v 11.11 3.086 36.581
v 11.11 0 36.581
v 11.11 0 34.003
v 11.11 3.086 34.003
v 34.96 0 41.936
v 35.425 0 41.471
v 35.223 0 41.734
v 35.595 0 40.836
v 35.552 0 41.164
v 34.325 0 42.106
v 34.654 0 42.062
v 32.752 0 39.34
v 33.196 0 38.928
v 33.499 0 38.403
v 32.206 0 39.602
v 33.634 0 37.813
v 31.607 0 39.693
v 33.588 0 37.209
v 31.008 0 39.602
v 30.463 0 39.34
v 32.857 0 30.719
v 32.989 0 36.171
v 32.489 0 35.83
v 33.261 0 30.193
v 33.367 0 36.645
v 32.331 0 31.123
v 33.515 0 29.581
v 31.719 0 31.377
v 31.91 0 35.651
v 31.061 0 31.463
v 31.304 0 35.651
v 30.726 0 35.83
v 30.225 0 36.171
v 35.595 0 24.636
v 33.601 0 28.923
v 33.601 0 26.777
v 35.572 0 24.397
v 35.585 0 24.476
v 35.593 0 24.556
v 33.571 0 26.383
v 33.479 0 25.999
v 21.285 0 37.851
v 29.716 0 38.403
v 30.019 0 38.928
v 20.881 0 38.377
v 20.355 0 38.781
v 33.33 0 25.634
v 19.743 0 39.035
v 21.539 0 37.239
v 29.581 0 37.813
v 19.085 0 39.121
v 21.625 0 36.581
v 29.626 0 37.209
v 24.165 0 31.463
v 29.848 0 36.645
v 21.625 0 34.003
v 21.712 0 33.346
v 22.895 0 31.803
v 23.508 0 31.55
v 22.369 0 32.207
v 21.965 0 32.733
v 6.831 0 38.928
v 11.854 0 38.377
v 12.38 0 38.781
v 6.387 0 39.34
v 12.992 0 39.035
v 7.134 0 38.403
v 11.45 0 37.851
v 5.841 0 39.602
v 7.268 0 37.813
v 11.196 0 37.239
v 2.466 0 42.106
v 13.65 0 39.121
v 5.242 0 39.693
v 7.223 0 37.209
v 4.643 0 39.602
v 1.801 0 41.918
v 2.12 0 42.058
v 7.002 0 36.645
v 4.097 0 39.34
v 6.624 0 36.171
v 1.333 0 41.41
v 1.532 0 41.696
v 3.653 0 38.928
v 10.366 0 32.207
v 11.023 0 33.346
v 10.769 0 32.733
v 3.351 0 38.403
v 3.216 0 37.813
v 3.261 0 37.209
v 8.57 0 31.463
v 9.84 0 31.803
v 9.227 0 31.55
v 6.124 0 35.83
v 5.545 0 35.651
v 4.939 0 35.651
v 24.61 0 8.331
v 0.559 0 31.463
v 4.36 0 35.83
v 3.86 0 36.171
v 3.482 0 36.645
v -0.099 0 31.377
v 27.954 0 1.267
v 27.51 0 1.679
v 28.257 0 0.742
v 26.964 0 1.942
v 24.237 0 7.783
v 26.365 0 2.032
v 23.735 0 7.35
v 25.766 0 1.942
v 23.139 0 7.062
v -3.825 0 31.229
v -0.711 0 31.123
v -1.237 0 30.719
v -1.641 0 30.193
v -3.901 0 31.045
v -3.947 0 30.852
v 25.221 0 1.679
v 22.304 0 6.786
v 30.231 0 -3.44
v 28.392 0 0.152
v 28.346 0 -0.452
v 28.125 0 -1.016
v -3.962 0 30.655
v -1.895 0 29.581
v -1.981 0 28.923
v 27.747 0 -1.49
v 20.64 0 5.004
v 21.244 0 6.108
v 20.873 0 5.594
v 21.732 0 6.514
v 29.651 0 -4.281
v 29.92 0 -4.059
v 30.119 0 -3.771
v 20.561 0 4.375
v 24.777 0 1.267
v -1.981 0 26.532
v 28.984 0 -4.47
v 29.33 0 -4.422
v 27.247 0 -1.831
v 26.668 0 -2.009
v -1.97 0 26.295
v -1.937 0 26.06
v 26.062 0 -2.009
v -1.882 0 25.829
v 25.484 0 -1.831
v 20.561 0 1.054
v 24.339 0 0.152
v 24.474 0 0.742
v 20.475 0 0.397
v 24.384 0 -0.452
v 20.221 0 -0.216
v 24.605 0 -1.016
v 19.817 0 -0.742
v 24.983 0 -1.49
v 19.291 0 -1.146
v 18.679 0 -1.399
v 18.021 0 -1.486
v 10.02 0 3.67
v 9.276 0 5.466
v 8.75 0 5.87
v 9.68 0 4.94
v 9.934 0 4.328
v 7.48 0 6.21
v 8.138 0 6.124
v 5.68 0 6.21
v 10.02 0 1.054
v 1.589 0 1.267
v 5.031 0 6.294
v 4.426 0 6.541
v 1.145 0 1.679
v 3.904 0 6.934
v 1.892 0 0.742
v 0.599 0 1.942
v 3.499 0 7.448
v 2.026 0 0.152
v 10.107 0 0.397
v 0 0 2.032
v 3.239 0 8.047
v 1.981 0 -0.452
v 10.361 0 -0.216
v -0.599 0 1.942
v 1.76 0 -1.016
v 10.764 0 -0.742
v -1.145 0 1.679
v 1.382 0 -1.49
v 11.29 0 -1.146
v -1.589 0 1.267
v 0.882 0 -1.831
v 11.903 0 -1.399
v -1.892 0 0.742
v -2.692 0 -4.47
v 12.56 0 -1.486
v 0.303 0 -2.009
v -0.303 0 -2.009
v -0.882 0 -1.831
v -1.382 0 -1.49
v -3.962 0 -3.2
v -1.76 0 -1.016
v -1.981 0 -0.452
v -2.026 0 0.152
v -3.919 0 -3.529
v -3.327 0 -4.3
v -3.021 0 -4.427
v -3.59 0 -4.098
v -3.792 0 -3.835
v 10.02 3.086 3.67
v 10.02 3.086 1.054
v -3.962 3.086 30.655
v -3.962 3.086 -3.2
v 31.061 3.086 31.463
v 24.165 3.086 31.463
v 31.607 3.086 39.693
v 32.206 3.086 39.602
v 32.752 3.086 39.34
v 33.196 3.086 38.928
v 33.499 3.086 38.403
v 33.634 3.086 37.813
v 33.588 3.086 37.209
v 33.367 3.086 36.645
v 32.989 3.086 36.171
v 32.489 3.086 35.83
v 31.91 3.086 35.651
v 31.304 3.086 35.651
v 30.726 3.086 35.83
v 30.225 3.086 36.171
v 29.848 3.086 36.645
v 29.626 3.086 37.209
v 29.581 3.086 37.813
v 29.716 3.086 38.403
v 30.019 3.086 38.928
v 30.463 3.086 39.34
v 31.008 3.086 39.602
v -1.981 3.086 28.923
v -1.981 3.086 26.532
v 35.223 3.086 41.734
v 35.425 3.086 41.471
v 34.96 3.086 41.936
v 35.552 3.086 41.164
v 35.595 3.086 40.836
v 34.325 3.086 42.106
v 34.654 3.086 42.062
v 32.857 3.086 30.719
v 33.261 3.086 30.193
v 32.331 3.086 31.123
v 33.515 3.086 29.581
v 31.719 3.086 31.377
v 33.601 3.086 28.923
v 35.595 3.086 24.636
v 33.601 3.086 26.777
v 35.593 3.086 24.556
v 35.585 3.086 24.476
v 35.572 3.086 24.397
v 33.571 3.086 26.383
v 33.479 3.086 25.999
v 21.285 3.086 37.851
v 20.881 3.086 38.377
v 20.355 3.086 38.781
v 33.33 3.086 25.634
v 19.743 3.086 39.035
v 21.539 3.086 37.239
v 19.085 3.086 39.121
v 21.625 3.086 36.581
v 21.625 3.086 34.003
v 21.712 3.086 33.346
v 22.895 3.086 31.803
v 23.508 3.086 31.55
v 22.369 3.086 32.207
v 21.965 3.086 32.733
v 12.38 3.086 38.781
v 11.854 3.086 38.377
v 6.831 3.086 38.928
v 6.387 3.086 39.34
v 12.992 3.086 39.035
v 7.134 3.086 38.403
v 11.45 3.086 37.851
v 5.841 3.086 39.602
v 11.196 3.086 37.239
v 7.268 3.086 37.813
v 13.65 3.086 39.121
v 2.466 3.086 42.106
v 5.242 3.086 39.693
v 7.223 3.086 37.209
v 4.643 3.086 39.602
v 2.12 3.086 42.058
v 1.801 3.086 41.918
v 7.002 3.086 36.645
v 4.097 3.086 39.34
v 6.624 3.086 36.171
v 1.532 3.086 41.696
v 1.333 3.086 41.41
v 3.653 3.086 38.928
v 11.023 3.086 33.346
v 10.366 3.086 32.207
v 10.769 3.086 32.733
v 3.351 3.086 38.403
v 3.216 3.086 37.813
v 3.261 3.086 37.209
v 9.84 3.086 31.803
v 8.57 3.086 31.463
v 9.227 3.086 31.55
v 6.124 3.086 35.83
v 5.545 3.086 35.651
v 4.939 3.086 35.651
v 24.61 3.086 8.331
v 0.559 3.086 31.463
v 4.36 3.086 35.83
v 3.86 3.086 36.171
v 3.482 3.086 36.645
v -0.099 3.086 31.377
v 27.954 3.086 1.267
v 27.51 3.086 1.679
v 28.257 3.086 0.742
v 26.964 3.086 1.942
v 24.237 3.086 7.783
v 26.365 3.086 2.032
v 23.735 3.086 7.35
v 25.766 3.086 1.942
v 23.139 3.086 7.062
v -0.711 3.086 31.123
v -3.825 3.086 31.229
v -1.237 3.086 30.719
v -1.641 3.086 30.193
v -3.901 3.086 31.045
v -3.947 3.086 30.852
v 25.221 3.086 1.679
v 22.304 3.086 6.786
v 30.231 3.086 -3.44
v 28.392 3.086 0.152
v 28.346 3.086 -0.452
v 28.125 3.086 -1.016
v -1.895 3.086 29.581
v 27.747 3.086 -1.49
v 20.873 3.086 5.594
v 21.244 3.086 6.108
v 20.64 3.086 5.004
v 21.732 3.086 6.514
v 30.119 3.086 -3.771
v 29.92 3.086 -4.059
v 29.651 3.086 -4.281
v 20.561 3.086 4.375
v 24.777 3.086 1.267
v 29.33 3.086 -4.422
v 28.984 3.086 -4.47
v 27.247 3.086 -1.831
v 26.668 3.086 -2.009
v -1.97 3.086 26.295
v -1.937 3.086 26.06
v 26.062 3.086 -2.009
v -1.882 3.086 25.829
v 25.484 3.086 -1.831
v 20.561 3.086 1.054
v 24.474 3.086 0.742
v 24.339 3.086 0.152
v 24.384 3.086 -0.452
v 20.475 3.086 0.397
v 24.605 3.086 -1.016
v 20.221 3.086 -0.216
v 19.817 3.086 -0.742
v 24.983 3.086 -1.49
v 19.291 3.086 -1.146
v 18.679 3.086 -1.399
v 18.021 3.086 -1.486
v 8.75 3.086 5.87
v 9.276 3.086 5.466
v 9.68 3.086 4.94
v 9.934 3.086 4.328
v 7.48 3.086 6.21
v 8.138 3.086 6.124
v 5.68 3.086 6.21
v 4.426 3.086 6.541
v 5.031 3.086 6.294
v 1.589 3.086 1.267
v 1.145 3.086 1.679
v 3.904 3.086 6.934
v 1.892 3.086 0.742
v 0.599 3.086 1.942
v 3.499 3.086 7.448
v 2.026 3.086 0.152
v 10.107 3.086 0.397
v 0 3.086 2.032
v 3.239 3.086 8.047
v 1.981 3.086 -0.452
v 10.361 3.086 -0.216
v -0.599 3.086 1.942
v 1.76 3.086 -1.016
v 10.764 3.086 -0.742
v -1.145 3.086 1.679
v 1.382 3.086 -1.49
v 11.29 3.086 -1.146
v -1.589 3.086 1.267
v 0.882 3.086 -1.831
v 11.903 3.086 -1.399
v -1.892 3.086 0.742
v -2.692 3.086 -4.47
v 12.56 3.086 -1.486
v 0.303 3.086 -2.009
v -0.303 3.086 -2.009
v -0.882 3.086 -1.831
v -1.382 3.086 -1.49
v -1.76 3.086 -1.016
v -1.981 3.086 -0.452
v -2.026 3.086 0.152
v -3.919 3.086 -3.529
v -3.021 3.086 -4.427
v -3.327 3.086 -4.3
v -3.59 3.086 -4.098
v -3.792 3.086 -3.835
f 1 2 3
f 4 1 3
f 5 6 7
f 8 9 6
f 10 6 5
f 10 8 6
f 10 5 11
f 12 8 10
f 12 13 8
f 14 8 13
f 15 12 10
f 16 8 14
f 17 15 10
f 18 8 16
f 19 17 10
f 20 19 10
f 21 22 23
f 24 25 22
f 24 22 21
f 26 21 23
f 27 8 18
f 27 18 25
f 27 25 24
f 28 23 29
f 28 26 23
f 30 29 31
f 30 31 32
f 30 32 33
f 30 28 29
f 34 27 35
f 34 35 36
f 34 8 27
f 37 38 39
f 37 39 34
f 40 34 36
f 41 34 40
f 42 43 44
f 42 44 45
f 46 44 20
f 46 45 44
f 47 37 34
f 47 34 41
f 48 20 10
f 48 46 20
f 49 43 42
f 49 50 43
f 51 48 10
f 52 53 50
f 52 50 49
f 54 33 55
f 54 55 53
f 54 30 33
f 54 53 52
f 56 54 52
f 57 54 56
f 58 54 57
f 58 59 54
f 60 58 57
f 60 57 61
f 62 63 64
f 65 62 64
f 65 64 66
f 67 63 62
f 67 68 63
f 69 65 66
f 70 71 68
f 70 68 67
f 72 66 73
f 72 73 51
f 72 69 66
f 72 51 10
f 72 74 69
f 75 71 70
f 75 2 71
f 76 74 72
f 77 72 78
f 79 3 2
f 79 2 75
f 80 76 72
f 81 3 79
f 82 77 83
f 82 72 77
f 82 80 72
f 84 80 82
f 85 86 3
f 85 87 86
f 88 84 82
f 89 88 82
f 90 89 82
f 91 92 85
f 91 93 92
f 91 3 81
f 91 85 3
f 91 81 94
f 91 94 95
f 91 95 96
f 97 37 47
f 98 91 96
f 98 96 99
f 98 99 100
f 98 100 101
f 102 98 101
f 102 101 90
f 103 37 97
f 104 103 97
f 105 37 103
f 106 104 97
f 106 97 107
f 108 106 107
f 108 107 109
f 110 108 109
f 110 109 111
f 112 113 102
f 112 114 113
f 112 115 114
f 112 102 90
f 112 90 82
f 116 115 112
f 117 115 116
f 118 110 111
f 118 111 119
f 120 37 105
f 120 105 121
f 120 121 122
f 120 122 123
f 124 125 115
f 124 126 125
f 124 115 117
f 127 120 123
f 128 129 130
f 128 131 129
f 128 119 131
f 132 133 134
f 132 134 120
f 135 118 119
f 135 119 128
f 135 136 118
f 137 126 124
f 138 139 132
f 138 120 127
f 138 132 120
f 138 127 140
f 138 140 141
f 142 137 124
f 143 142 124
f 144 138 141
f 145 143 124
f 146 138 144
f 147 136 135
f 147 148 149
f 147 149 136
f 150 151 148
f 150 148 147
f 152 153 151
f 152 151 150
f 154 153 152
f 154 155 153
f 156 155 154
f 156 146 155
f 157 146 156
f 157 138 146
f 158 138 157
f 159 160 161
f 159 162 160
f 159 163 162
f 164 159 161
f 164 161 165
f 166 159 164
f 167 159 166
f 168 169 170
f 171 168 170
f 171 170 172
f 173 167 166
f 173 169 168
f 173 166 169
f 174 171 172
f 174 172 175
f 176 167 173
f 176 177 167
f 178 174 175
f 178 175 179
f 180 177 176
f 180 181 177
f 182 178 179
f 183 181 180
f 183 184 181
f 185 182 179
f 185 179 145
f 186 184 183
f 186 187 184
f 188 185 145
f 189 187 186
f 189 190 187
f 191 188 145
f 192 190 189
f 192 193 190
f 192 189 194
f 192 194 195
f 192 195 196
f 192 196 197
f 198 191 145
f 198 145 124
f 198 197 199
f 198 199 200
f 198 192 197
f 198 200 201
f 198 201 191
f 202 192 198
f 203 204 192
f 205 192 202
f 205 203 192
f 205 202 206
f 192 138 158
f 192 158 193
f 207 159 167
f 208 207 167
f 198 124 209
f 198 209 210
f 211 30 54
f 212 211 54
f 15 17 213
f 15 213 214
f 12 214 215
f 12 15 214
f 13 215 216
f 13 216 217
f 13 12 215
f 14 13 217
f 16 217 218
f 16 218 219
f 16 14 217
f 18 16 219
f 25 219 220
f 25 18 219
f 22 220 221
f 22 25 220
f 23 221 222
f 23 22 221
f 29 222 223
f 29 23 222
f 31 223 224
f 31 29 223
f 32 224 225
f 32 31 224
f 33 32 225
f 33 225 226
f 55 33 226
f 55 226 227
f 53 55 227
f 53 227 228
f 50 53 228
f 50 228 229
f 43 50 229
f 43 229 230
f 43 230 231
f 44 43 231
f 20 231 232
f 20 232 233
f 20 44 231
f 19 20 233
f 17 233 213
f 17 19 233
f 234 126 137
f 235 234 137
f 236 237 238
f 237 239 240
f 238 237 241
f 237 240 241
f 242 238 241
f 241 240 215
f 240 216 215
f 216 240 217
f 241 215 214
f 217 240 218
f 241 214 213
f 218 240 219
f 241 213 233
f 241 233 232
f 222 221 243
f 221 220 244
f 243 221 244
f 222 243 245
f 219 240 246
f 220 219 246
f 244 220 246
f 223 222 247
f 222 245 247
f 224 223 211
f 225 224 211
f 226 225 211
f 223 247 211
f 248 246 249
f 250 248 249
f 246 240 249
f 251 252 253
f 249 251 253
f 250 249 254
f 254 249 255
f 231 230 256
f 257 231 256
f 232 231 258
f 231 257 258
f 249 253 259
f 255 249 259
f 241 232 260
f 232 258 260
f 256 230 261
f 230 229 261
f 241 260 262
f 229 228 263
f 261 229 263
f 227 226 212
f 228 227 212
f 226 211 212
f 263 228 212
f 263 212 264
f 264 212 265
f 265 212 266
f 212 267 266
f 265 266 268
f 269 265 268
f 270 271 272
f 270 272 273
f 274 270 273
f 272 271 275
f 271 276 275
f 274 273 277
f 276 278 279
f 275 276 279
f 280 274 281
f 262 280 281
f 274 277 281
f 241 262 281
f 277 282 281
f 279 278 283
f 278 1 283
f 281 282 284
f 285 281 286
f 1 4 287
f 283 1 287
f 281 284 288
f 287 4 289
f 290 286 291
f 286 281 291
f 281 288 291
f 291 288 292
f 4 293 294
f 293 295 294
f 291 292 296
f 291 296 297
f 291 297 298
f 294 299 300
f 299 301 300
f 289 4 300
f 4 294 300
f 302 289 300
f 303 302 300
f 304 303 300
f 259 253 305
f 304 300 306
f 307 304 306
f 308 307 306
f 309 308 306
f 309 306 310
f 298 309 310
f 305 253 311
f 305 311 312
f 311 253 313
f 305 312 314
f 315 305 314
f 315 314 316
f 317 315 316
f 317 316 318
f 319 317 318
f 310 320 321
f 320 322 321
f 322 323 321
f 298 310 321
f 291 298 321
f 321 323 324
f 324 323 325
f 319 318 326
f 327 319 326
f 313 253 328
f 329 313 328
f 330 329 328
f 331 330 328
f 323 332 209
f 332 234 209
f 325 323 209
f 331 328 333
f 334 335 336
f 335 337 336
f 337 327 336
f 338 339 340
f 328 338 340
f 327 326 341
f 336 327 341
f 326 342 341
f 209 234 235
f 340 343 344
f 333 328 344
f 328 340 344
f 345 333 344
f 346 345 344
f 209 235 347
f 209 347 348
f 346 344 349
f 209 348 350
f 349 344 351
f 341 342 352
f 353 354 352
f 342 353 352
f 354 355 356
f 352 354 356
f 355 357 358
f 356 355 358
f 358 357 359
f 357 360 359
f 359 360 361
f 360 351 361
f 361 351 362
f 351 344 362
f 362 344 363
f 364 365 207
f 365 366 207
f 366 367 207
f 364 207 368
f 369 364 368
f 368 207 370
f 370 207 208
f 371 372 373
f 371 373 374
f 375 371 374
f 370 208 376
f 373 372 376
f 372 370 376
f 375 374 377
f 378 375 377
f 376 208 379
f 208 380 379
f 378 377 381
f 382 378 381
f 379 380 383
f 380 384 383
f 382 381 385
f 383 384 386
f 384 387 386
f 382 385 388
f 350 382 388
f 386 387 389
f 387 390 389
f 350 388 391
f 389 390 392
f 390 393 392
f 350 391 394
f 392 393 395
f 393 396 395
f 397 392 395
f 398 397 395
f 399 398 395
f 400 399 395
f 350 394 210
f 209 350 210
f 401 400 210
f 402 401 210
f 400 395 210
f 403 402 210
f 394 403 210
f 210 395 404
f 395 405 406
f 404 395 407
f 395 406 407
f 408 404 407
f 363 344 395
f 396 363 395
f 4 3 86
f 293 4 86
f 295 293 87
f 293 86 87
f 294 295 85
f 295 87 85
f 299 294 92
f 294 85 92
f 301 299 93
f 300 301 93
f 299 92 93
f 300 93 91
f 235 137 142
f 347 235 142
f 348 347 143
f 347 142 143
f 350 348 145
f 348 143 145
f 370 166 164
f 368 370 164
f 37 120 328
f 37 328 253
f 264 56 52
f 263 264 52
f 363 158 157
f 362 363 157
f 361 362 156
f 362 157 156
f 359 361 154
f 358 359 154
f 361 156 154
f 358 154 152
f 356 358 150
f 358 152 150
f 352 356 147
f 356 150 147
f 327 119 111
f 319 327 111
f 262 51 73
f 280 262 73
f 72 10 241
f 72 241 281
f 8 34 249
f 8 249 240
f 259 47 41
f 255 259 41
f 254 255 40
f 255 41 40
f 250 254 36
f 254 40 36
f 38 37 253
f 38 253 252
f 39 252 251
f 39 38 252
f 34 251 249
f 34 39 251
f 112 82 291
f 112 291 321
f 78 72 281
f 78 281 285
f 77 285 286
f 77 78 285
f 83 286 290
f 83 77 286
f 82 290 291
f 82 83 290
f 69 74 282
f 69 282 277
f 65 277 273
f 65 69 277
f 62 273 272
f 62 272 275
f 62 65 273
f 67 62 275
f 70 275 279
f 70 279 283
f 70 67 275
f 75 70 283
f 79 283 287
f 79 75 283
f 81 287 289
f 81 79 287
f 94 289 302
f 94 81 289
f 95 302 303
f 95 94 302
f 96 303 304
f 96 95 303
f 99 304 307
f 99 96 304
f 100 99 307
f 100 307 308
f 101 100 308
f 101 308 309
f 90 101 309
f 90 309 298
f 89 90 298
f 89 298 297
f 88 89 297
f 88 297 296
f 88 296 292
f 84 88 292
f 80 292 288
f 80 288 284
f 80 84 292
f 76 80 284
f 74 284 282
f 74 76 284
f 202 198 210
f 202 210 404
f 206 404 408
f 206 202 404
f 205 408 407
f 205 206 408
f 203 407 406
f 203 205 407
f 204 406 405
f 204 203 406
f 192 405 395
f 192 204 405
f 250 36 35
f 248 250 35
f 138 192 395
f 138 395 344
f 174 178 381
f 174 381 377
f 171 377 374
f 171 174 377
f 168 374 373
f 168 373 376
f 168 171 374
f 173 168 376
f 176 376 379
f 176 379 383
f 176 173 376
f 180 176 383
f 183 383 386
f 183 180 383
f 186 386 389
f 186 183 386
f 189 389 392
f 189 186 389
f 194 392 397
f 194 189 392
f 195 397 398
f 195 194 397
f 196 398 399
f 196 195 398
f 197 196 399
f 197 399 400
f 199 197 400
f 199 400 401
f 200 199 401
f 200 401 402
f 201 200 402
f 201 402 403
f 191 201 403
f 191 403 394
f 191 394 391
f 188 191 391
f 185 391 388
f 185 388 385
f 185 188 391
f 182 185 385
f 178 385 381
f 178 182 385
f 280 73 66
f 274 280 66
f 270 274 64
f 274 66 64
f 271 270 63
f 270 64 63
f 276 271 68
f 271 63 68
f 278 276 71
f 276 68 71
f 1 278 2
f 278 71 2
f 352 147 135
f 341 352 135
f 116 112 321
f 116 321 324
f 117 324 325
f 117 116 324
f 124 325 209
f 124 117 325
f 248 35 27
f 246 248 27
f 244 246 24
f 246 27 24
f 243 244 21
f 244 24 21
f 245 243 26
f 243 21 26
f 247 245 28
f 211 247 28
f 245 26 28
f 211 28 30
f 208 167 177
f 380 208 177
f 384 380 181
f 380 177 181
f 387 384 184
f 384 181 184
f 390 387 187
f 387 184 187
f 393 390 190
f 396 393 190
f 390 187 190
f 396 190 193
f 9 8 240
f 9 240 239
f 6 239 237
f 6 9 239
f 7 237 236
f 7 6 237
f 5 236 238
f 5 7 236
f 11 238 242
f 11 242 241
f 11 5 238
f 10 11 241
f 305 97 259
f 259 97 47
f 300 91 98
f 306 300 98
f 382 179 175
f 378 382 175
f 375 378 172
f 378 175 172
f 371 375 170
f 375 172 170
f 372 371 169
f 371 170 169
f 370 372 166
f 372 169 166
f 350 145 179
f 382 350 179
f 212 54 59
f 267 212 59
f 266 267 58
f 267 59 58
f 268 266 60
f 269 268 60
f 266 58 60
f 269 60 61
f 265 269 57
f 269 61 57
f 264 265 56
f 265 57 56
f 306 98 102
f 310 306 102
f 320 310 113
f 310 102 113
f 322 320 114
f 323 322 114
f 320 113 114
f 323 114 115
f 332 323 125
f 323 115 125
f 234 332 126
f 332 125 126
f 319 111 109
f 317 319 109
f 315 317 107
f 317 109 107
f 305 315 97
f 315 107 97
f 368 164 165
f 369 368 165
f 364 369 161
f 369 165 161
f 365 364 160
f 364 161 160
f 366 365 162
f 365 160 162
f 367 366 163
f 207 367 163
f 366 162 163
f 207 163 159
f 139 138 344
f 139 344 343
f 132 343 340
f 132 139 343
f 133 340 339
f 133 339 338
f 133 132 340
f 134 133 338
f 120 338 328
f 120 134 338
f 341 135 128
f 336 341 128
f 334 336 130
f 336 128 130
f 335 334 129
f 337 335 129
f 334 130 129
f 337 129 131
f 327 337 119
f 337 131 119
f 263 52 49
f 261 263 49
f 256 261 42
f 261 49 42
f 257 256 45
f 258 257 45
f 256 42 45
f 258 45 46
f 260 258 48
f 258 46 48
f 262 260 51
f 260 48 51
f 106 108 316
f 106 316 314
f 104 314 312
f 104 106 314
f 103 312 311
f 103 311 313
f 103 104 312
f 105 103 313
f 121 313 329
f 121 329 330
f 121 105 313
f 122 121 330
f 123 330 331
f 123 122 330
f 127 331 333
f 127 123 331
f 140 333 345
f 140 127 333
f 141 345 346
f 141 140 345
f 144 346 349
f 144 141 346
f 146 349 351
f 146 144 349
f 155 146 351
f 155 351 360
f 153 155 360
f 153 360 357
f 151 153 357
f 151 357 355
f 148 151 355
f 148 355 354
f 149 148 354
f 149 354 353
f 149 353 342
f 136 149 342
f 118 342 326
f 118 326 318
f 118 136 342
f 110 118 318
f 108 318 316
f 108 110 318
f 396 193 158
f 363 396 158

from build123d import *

# Parameters (mm, degrees)
SKETCH1_R           = 2.032
BOSS_EXTRUDE1_DEPTH = 3.0861


with BuildPart() as part:
    # Sketch1 → Boss-Extrude1 (new body)
    with BuildSketch(Plane(origin=(0, 0, 0), x_dir=(1, 0, 0), z_dir=(0, 1, 0))):
        with BuildLine():
            Line((-2.6924, 4.4704), (28.98404818, 4.4704))
            ThreePointArc((28.98404818, 4.4704), (29.793051754, 4.179385811), (30.23129703, 3.439712155))
            Line((30.23129703, 3.439712155), (35.572400198, -24.397088649))
            ThreePointArc((35.572400198, -24.397088649), (35.589450767, -24.516205211), (35.595151349, -24.636400804))
            Line((35.595151349, -24.636400804), (35.595151349, -40.835711832))
            ThreePointArc((35.595151349, -40.835711832), (35.223176961, -41.733737444), (34.325151349, -42.105711832))
            Line((34.325151349, -42.105711832), (2.465757874, -42.105711832))
            ThreePointArc((2.465757874, -42.105711832), (1.800944431, -41.917803827), (1.332861331, -41.409685196))
            Line((1.332861331, -41.409685196), (-3.825296543, -31.228621763))
            ThreePointArc((-3.825296543, -31.228621763), (-3.927648681, -30.949708893), (-3.9624, -30.6546484))
            Line((-3.9624, -30.6546484), (-3.9624, 3.2004))
            ThreePointArc((-3.9624, 3.2004), (-3.590425612, 4.098425612), (-2.6924, 4.4704))
        make_face()
        with Locations(Location((0, 0, 0), (0, 0, 270))):
            Circle(SKETCH1_R, mode=Mode.SUBTRACT)
        with Locations(Location((26.3652, 0, 0), (0, 0, 270))):
            Circle(SKETCH1_R, mode=Mode.SUBTRACT)
        with Locations(Location((5.242151349, -37.660711832, 0), (0, 0, 270))):
            Circle(SKETCH1_R, mode=Mode.SUBTRACT)
        with Locations(Location((31.607351349, -37.660711832, 0), (0, 0, 270))):
            Circle(SKETCH1_R, mode=Mode.SUBTRACT)
        with BuildLine():
            Line((12.5603, 1.4859), (18.0213, 1.4859))
            ThreePointArc((18.0213, 1.4859), (19.817351224, 0.741951224), (20.5613, -1.0541))
            Line((20.5613, -1.0541), (20.5613, -4.374589338))
            ThreePointArc((20.5613, -4.374589338), (21.042661976, -5.86240972), (22.304299596, -6.786308716))
            Line((22.304299596, -6.786308716), (23.138687105, -7.062048584))
            ThreePointArc((23.138687105, -7.062048584), (24.000408807, -7.550166917), (24.609958316, -8.330726456))
            Line((24.609958316, -8.330726456), (33.329522963, -25.633983509))
            ThreePointArc((33.329522963, -25.633983509), (33.532385694, -26.189577102), (33.601251349, -26.777025014))
            Line((33.601251349, -26.777025014), (33.601251349, -28.923111832))
            ThreePointArc((33.601251349, -28.923111832), (32.857302573, -30.719163056), (31.061251349, -31.463111832))
            Line((31.061251349, -31.463111832), (24.165151349, -31.463111832))
            ThreePointArc((24.165151349, -31.463111832), (22.369100125, -32.207060608), (21.625151349, -34.003111832))
            Line((21.625151349, -34.003111832), (21.625151349, -36.581211832))
            ThreePointArc((21.625151349, -36.581211832), (20.881202573, -38.377263056), (19.085151349, -39.121211832))
            Line((19.085151349, -39.121211832), (13.649551349, -39.121211832))
            ThreePointArc((13.649551349, -39.121211832), (11.853500125, -38.377263056), (11.109551349, -36.581211832))
            Line((11.109551349, -36.581211832), (11.109551349, -34.003111832))
            ThreePointArc((11.109551349, -34.003111832), (10.365602573, -32.207060608), (8.569551349, -31.463111832))
            Line((8.569551349, -31.463111832), (0.5588, -31.463111832))
            ThreePointArc((0.5588, -31.463111832), (-1.237251224, -30.719163056), (-1.9812, -28.923111832))
            Line((-1.9812, -28.923111832), (-1.9812, -26.531672272))
            ThreePointArc((-1.9812, -26.531672272), (-1.956276805, -26.176723455), (-1.881996329, -25.828740353))
            Line((-1.881996329, -25.828740353), (3.23891195, -8.047368081))
            ThreePointArc((3.23891195, -8.047368081), (4.15226713, -6.72088542), (5.679708279, -6.2103))
            Line((5.679708279, -6.2103), (7.4803, -6.2103))
            ThreePointArc((7.4803, -6.2103), (9.276351224, -5.466351224), (10.0203, -3.6703))
            Line((10.0203, -3.6703), (10.0203, -1.0541))
            ThreePointArc((10.0203, -1.0541), (10.764248776, 0.741951224), (12.5603, 1.4859))
        make_face(mode=Mode.SUBTRACT)
    extrude(amount=BOSS_EXTRUDE1_DEPTH)


solid = part.part
